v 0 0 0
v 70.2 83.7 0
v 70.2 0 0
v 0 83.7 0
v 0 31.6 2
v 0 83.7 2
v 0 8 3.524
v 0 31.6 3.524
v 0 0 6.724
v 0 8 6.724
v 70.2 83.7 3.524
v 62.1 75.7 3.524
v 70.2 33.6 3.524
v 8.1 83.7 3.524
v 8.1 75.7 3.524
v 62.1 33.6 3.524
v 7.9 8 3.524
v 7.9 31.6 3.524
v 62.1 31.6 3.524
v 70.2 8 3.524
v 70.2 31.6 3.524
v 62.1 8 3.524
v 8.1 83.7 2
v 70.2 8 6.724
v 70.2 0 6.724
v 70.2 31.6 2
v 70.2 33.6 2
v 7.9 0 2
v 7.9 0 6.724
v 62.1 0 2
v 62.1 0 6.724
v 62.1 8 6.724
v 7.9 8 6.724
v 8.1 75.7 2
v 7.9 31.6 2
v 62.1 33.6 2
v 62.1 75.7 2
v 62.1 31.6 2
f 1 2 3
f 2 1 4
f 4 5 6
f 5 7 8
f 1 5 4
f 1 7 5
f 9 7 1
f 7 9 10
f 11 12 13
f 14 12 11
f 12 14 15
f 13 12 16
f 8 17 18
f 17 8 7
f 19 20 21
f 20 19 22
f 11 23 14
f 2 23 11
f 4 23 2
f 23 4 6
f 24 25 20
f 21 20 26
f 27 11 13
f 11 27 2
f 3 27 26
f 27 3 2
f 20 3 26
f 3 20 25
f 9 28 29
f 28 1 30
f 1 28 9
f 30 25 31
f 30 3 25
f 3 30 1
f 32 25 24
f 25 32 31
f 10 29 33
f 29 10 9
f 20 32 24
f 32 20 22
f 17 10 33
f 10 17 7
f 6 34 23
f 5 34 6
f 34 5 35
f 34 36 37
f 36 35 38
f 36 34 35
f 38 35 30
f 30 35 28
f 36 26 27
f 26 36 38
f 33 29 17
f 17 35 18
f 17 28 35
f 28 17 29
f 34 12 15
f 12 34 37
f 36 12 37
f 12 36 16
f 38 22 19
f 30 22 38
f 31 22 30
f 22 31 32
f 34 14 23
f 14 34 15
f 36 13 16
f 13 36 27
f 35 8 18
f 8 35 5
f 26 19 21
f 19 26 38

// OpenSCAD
// file: flap_dimensions.scad
/*
   Copyright 2018 Scott Bezek and the splitflap contributors

   Licensed under the Apache License, Version 2.0 (the "License");
   you may not use this file except in compliance with the License.
   You may obtain a copy of the License at

       http://www.apache.org/licenses/LICENSE-2.0

   Unless required by applicable law or agreed to in writing, software
   distributed under the License is distributed on an "AS IS" BASIS,
   WITHOUT WARRANTIES OR CONDITIONS OF ANY KIND, either express or implied.
   See the License for the specific language governing permissions and
   limitations under the License.
*/

flap_width = 54;
flap_height = 43;
flap_thickness = 30 / 1000 * 25.4; // 30 mil
flap_corner_radius = 3.1; // 2.88-3.48mm (used just for display)

flap_pin_width = 1.4;
// main file
/*
   Copyright 2020 Scott Bezek and the splitflap contributors

   Licensed under the Apache License, Version 2.0 (the "License");
   you may not use this file except in compliance with the License.
   You may obtain a copy of the License at

       http://www.apache.org/licenses/LICENSE-2.0

   Unless required by applicable law or agreed to in writing, software
   distributed under the License is distributed on an "AS IS" BASIS,
   WITHOUT WARRANTIES OR CONDITIONS OF ANY KIND, either express or implied.
   See the License for the specific language governing permissions and
   limitations under the License.
*/

include<flap_dimensions.scad>

print_tolerance = 0.1;
eps = 0.1;
jig_thickness = 2.0; // Vertical thickness of the jig base.
jig_border = 8.0; // horizontal extent of the jig outside the flap size.
flap_slot_depth = 2 * flap_thickness; // depth of the recess the flap sits in.
cutting_slot_width = 2.0; // Relief in the border for the blade to start and stop in.

jig_width = jig_border*2 + print_tolerance * 2 + flap_width;

ruler_width = 24.6;
ruler_depth = 1.6;
ruler_backstop_height = ruler_depth * 2;

difference() {
    union() {
        // Main body of the jig
        linear_extrude(height=jig_thickness + flap_slot_depth) {
            square([jig_width,jig_border*2 + print_tolerance + ruler_width + flap_height]);
        }
        // Backstop for ruler/cutting guide
        linear_extrude(height=jig_thickness + flap_slot_depth + ruler_backstop_height) {
            square(size=[jig_border*2 + print_tolerance * 2 + flap_width, jig_border]);
        }
    }
    union() {
        translate([jig_border - print_tolerance,-eps,jig_thickness]) {
            // Main area for card to sit into
            linear_extrude(height=flap_slot_depth + ruler_backstop_height + eps) {
                square([flap_width + 2 * print_tolerance, flap_height + print_tolerance + ruler_width + jig_border + eps]);
            }
        }
        translate([-eps ,jig_border + ruler_width, jig_thickness]) {
            // remove material from the left side so only the top and right sides are braced
            linear_extrude(height=flap_slot_depth + eps) {
                square([jig_border + print_tolerance + eps, flap_height + print_tolerance + jig_border + eps]);
            }
        }
        translate([-eps, jig_border + ruler_width - cutting_slot_width / 2, jig_thickness]) {
            // Relieve a slot for the blade to start and finish in
            linear_extrude(height=flap_slot_depth + eps) {
                square([jig_width + 2*eps,cutting_slot_width]);
            }
        }
    }
}
